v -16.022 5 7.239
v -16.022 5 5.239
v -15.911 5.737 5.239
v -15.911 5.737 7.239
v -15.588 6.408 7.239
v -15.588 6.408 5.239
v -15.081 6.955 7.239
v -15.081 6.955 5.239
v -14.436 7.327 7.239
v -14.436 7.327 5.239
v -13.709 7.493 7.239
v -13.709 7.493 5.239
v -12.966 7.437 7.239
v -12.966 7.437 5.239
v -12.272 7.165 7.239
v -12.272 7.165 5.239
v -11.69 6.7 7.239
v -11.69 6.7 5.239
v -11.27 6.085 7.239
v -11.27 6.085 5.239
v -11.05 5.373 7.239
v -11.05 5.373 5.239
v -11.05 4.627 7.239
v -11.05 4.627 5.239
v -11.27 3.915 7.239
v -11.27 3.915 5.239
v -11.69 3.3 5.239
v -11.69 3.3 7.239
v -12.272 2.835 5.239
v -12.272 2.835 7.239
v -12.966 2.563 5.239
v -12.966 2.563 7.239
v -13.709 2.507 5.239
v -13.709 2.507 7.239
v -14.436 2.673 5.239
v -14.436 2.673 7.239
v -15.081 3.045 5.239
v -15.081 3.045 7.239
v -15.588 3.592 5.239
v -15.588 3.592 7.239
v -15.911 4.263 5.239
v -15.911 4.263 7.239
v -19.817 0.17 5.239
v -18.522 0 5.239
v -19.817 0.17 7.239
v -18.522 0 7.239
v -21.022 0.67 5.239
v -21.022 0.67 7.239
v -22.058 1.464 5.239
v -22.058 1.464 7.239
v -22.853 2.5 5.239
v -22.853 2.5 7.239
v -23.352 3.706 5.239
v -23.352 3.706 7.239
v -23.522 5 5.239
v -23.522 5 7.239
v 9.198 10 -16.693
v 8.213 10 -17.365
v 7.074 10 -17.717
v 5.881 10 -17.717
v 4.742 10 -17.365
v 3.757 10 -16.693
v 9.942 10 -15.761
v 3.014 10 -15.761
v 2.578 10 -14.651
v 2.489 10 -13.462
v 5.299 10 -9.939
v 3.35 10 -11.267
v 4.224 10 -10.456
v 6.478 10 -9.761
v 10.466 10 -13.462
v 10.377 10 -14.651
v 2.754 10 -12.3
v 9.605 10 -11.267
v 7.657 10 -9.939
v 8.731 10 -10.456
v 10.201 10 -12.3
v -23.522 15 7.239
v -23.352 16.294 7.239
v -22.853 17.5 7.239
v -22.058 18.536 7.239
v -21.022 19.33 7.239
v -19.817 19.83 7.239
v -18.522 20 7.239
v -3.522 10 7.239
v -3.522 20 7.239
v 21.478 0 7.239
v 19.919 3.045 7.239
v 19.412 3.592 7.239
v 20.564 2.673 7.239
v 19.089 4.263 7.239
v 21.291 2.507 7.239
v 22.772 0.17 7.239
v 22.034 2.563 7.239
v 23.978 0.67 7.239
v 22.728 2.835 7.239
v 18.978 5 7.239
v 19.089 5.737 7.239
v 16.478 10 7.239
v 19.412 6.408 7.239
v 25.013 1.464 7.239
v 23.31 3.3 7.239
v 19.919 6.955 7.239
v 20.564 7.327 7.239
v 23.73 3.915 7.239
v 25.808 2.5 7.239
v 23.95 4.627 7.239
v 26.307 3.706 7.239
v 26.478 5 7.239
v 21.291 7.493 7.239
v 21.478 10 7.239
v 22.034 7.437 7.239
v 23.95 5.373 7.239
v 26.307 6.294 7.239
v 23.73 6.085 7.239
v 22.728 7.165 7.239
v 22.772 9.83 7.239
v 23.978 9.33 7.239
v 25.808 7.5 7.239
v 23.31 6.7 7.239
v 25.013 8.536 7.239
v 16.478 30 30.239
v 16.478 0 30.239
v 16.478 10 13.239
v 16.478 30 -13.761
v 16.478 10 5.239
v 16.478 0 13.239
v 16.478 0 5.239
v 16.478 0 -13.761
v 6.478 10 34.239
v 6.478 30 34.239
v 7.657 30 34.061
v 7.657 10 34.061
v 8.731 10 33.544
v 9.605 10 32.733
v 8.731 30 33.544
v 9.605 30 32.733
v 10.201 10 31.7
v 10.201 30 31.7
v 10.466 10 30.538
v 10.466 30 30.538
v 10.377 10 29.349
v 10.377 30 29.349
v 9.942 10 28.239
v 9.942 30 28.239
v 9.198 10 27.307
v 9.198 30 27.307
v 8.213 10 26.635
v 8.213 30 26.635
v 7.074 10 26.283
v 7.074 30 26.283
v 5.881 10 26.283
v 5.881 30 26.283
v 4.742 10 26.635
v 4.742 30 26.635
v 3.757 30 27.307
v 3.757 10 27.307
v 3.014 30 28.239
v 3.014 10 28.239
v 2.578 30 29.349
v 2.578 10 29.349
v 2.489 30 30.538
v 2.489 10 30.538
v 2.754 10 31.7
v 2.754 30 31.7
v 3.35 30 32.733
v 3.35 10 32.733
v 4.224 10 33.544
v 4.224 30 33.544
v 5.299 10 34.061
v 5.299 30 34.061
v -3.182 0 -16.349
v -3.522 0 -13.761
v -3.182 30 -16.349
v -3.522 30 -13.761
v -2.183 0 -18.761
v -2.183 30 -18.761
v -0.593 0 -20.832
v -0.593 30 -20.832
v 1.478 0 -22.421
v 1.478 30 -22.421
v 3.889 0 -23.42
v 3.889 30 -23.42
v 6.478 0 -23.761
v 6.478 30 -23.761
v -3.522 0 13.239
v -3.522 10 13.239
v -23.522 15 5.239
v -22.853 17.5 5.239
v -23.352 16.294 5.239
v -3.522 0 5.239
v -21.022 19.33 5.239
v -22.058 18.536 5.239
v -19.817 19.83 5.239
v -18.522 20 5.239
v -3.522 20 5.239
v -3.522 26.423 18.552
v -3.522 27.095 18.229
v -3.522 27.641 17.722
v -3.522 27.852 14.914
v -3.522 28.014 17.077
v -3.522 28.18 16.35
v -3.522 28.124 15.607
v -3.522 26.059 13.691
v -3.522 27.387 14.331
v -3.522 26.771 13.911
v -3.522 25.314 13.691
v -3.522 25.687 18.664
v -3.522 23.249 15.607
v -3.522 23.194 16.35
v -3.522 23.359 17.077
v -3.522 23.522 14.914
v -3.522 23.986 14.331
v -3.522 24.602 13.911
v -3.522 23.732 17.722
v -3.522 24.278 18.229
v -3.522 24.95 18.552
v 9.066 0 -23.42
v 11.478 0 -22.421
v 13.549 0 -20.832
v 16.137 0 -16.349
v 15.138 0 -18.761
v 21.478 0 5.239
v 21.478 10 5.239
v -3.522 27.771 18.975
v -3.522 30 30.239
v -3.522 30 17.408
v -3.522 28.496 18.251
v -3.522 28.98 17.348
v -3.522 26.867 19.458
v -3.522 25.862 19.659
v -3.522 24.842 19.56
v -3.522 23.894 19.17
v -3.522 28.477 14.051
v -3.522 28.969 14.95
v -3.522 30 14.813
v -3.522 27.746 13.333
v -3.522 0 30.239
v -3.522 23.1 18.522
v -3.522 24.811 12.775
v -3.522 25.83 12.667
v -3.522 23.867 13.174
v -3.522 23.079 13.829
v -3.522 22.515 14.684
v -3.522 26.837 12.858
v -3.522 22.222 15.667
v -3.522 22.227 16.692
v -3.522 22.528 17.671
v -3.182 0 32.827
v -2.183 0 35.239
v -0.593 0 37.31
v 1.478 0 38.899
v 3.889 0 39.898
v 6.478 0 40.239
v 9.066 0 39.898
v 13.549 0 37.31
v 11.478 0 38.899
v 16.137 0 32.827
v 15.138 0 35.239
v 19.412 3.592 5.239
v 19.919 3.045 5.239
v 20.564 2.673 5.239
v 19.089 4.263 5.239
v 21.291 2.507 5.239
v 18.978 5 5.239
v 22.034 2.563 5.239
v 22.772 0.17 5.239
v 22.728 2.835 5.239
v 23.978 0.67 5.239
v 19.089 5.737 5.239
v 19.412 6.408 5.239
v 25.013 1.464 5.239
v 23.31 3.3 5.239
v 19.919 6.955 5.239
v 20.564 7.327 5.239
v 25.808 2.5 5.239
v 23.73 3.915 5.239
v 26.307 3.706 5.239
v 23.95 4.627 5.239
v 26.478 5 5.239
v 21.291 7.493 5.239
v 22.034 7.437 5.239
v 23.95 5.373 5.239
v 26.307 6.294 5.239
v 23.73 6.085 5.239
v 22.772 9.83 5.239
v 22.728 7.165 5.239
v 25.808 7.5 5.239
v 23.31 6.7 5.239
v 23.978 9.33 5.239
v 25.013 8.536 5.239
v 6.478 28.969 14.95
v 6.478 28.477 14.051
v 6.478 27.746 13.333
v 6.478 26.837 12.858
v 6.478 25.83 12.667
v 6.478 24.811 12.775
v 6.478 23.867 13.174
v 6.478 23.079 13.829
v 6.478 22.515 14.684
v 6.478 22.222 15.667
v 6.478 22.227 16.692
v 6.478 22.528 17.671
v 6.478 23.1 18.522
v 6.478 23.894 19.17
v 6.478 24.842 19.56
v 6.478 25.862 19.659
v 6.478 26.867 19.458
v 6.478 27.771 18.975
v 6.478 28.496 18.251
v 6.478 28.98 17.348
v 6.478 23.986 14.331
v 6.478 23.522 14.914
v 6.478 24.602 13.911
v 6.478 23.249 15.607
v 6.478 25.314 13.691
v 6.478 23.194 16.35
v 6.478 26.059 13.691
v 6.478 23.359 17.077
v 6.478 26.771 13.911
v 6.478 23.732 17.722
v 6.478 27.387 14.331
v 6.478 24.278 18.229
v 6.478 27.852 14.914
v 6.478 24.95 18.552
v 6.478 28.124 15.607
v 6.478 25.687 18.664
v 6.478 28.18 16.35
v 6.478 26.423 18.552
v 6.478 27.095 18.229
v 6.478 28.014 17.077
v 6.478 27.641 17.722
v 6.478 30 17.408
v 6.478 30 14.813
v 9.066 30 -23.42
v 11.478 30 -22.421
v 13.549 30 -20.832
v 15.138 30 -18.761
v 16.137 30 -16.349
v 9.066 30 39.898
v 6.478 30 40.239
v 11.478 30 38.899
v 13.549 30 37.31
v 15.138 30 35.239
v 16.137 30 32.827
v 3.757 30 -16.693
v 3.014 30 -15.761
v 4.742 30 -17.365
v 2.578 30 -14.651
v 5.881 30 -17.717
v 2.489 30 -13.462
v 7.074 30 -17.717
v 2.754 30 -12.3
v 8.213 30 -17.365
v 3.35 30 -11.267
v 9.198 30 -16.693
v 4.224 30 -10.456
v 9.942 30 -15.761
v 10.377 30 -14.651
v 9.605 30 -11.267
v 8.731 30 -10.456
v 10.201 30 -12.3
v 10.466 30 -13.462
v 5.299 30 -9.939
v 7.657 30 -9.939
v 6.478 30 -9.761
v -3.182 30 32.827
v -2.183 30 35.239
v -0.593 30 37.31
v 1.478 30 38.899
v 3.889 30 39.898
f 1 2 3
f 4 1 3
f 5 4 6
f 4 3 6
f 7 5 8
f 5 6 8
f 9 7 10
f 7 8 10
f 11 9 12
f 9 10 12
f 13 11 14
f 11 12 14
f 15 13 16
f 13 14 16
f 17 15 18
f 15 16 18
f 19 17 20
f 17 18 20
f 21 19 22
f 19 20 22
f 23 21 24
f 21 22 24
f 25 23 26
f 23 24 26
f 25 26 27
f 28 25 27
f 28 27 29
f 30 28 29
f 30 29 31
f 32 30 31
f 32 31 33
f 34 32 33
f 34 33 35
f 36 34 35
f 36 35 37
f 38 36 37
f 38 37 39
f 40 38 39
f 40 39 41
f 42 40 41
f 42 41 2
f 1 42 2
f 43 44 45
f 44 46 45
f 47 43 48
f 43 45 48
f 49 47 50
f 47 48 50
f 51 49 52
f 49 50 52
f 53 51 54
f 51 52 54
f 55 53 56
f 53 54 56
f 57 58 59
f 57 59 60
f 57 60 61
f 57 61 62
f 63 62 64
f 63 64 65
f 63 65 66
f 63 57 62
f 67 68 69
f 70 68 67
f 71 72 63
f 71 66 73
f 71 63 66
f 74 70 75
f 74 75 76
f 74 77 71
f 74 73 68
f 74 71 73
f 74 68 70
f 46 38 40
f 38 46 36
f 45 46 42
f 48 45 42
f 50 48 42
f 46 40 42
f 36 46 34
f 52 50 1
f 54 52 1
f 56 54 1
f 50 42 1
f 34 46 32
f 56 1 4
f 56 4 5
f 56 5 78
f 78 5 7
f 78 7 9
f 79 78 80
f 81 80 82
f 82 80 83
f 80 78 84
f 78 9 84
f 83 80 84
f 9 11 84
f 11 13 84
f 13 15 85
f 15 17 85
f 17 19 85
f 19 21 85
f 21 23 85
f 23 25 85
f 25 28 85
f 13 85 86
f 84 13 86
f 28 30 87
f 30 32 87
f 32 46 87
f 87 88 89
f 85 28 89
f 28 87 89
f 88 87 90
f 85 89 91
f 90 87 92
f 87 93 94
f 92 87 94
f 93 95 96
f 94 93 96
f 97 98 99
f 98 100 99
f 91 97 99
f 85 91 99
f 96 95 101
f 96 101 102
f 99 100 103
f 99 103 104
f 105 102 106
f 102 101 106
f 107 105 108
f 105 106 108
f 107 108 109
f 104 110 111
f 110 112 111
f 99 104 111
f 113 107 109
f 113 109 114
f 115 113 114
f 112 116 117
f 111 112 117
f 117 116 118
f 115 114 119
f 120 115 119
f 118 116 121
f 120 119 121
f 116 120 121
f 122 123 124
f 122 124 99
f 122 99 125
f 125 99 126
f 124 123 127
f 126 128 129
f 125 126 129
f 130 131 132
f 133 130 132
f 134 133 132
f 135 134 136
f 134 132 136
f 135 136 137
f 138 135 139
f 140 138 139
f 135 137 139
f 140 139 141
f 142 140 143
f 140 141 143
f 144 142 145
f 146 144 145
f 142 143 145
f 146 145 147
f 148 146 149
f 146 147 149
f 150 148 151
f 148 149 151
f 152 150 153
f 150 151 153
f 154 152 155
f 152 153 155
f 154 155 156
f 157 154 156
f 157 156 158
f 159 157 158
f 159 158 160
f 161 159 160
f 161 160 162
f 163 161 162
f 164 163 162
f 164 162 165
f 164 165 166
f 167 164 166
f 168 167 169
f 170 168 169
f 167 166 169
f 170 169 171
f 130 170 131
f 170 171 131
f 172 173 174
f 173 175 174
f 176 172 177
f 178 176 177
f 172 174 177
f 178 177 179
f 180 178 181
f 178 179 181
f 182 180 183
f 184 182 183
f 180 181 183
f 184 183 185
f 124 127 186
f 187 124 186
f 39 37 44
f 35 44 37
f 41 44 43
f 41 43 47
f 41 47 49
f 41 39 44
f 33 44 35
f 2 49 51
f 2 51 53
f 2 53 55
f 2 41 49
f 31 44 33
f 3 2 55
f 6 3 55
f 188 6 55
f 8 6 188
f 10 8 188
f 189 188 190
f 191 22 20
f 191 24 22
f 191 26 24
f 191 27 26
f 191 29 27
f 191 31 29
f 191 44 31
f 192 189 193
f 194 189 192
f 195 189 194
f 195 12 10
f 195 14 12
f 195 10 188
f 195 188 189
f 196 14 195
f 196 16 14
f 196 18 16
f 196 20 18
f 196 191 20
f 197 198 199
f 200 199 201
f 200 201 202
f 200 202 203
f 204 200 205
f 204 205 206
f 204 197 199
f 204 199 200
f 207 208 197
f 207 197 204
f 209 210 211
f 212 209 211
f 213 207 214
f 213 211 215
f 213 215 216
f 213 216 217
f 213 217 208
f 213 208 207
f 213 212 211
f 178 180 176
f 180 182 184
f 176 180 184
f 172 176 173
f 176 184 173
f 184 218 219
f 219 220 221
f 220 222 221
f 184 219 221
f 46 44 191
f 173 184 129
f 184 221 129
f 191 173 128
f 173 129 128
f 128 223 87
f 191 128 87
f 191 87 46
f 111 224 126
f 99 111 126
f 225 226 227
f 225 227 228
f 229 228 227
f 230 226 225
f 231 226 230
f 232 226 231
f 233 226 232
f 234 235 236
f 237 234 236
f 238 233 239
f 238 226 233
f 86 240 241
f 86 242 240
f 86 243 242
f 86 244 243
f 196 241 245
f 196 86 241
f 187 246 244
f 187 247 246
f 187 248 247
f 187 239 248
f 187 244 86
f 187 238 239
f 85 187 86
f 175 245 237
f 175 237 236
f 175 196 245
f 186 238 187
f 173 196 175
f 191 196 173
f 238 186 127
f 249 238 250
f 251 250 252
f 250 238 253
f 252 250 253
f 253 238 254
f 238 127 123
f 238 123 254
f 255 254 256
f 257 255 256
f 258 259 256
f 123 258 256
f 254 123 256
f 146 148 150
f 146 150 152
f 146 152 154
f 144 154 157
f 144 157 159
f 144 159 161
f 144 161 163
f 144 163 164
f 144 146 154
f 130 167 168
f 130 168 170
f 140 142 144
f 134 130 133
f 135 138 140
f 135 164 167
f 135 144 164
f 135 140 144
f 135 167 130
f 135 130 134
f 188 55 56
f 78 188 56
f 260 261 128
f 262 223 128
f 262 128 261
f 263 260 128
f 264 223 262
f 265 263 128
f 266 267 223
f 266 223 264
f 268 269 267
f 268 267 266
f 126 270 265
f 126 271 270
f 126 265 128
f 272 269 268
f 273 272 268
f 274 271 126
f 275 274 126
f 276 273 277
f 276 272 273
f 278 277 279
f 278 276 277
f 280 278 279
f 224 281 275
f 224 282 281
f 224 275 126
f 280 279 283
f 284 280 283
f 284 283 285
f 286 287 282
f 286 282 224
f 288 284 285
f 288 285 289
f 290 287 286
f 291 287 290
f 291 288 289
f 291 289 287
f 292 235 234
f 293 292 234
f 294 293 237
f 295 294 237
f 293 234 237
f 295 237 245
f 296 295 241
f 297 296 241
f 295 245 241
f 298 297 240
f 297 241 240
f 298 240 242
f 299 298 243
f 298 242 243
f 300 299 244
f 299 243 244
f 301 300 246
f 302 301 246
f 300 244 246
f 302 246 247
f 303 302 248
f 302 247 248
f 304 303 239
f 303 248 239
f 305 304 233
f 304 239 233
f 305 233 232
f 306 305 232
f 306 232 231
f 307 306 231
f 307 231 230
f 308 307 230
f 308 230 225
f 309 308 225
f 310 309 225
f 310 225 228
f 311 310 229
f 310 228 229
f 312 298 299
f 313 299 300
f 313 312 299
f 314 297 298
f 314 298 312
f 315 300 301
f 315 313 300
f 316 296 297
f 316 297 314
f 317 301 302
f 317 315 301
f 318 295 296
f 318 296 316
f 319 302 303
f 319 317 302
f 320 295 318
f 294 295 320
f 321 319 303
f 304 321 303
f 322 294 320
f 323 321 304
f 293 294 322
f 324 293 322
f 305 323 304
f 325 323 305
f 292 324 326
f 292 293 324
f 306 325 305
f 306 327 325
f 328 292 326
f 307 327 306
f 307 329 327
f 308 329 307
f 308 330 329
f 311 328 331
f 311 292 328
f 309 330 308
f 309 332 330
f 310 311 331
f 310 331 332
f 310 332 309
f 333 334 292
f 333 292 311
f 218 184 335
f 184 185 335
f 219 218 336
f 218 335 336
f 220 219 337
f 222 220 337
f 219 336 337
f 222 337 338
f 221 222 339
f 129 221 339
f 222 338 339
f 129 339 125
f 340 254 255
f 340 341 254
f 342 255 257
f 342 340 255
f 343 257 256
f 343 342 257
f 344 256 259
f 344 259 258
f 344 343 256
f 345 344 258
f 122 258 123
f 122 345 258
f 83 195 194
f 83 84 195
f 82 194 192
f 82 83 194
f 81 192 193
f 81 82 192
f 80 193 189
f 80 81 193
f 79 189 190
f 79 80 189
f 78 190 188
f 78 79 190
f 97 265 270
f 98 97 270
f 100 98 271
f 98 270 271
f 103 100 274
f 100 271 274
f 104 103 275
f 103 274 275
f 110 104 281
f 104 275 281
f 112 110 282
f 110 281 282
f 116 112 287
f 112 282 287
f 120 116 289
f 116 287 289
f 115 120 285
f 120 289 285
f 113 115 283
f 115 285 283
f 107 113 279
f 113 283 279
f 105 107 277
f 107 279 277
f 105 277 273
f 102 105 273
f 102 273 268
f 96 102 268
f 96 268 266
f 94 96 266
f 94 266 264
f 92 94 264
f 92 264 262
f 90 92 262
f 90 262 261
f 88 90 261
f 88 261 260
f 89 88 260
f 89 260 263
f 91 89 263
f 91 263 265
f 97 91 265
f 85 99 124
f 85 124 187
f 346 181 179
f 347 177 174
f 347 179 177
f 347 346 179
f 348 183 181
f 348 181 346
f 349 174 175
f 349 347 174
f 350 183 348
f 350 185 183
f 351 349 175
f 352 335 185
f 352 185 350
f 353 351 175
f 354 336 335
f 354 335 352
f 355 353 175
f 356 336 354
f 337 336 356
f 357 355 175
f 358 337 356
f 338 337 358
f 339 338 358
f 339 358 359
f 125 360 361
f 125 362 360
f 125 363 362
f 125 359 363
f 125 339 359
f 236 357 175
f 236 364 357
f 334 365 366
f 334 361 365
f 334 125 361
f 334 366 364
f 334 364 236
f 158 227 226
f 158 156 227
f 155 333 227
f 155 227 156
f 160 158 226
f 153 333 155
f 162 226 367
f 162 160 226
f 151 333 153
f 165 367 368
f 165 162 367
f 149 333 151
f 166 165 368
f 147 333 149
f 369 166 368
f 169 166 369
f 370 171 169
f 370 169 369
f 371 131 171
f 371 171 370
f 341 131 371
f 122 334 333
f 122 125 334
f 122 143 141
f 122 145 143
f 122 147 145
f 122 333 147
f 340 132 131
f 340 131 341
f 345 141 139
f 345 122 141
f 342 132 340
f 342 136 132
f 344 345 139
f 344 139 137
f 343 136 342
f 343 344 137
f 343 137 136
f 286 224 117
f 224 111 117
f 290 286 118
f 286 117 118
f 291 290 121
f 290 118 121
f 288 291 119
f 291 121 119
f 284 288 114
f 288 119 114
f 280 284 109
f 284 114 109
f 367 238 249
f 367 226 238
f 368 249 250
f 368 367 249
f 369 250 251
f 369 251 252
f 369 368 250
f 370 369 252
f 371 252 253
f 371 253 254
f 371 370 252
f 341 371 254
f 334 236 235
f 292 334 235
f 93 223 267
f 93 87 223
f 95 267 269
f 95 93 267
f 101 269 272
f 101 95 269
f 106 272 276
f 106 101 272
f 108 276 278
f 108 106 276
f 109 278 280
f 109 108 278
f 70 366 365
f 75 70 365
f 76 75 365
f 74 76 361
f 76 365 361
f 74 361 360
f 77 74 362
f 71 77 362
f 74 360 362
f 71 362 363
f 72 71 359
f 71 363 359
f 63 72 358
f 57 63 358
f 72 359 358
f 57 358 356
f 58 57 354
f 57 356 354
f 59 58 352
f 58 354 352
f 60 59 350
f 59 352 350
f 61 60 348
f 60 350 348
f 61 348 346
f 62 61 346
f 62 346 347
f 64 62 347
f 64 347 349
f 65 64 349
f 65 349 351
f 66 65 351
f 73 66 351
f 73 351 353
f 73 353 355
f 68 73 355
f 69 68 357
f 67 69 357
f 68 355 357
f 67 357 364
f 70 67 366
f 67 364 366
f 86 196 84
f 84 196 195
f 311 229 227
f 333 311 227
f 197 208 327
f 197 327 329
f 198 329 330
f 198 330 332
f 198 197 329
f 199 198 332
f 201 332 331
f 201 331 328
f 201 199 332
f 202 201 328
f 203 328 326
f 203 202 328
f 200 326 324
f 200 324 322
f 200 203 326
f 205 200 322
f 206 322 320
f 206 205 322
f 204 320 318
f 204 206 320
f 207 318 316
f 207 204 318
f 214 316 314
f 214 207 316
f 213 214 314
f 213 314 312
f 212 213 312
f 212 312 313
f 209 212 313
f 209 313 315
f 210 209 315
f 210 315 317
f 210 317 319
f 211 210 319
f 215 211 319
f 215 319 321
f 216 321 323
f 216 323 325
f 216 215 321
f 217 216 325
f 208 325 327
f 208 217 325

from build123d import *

# Parameters (mm, degrees)
SKETCH2_W                = 20
SKETCH2_H                = 64
BOSS_EXTRUDE1_DEPTH      = 30
SKETCH3_R                = 4
CUT_EXTRUDE1_DEPTH       = 20
SKETCH4_R                = 2.5
CUT_EXTRUDE2_DEPTH       = 10
FILLET1_R                = 10
BOSS_EXTRUDE2_DEPTH      = 20
BOSS_EXTRUDE2_DEPTH_BACK = 30
SKETCH5_W                = 2
SKETCH5_H                = 30
CUT_EXTRUDE3_REACH       = 55.161
SKETCH6_R                = 2.5
SKETCH6_W                = 10
SKETCH6_H                = 20
SKETCH6_W_2              = 20
SKETCH6_H_2              = 10
FILLET2_R                = 5
SKETCH7_W                = 21
SKETCH7_H                = 6
CUT_EXTRUDE4_DEPTH       = 10


with BuildPart() as part:
    # Sketch2 → Boss-Extrude1 (new body)
    with BuildSketch(Plane(origin=(0, 0, 0), x_dir=(1, 0, 0), z_dir=(0, 1, 0))):
        with Locations((6.47761194, -8.23880597)):
            Rectangle(SKETCH2_W, SKETCH2_H)
    extrude(amount=BOSS_EXTRUDE1_DEPTH)

    # Sketch3 → Cut-Extrude1 (cut)
    with BuildSketch(Plane(origin=(0, 30, 0), x_dir=(1, 0, 0), z_dir=(0, 1, 0))):
        with Locations(Location((6.47761194, 13.76119403, 0), (0, 0, 270))):
            Circle(SKETCH3_R)
        with Locations(Location((6.47761194, -30.23880597, 0), (0, 0, 270))):
            Circle(SKETCH3_R)
    extrude(amount=-CUT_EXTRUDE1_DEPTH, mode=Mode.SUBTRACT)

    # Sketch4 → Cut-Extrude2 (cut)
    with BuildSketch(Plane.ZY.offset(3.52238806)):
        with BuildLine():
            Line((17.415034126, 30.126407987), (14.795699792, 30.126407987))
            Line((14.795699792, 30.126407987), (14.949961333, 28.969446425))
            ThreePointArc((14.949961333, 28.969446425), (16.17927412, 22.186618473), (17.347611009, 28.980215007))
            Line((17.347611009, 28.980215007), (17.415034126, 30.126407987))
        make_face()
        with Locations((16.163554702, 25.686583173)):
            Circle(SKETCH4_R, mode=Mode.SUBTRACT)
    extrude(amount=-CUT_EXTRUDE2_DEPTH, mode=Mode.SUBTRACT)

    # Fillet1
    fillet1_edges = [part.edges().sort_by_distance(p)[0] for p in [
        (-3.52238806, 15, -23.76119403),
        (16.47761194, 15, -23.76119403),
        (16.47761194, 15, 40.23880597),
        (-3.52238806, 15, 40.23880597),
    ]]
    fillet(fillet1_edges, radius=FILLET1_R - 0.0001)  # a hair under: the kernel refuses the full size

    # Sketch5 → Boss-Extrude2 (add, two sides: drawn at the far end of the back side and taken through both)
    with BuildSketch(Plane.ZY.offset(3.52238806).offset(-BOSS_EXTRUDE2_DEPTH_BACK)):
        with Locations((6.23880597, 15)):
            Rectangle(SKETCH5_W, SKETCH5_H)
    extrude(amount=BOSS_EXTRUDE2_DEPTH + BOSS_EXTRUDE2_DEPTH_BACK)

    # Sketch6 → Cut-Extrude3 (cut, up to next)
    with BuildSketch(Plane(origin=(0, 0, 5.23880597), x_dir=(-1, 0, 0), z_dir=(0, 0, -1)), mode=Mode.PRIVATE) as cut_extrude3_sk1:
        with Locations((-21.47761194, 5)):
            Circle(SKETCH6_R)
    cut_extrude3_tool1 = extrude(cut_extrude3_sk1.sketch, amount=-CUT_EXTRUDE3_REACH, mode=Mode.PRIVATE) & part.part
    # Sketch6 → Cut-Extrude3 (cut, up to next)
    with BuildSketch(Plane(origin=(0, 0, 5.23880597), x_dir=(-1, 0, 0), z_dir=(0, 0, -1)), mode=Mode.PRIVATE) as cut_extrude3_sk2:
        with Locations((13.52238806, 5)):
            Circle(SKETCH6_R)
    cut_extrude3_tool2 = extrude(cut_extrude3_sk2.sketch, amount=-CUT_EXTRUDE3_REACH, mode=Mode.PRIVATE) & part.part
    # Sketch6 → Cut-Extrude3 (cut, up to next)
    with BuildSketch(Plane(origin=(0, 0, 5.23880597), x_dir=(-1, 0, 0), z_dir=(0, 0, -1)), mode=Mode.PRIVATE) as cut_extrude3_sk3:
        with Locations((-21.47761194, 20)):
            Rectangle(SKETCH6_W, SKETCH6_H)
    cut_extrude3_tool3 = extrude(cut_extrude3_sk3.sketch, amount=-CUT_EXTRUDE3_REACH, mode=Mode.PRIVATE) & part.part
    # Sketch6 → Cut-Extrude3 (cut, up to next)
    with BuildSketch(Plane(origin=(0, 0, 5.23880597), x_dir=(-1, 0, 0), z_dir=(0, 0, -1)), mode=Mode.PRIVATE) as cut_extrude3_sk4:
        with Locations((13.52238806, 25)):
            Rectangle(SKETCH6_W_2, SKETCH6_H_2)
    cut_extrude3_tool4 = extrude(cut_extrude3_sk4.sketch, amount=-CUT_EXTRUDE3_REACH, mode=Mode.PRIVATE) & part.part
    add(cut_extrude3_tool1.solids().sort_by_distance((21.477612, 5, 5.238806))[0], mode=Mode.SUBTRACT)
    add(cut_extrude3_tool2.solids().sort_by_distance((-13.522388, 5, 5.238806))[0], mode=Mode.SUBTRACT)
    add(cut_extrude3_tool3.solids().sort_by_distance((21.477612, 20, 5.238806))[0], mode=Mode.SUBTRACT)
    add(cut_extrude3_tool4.solids().sort_by_distance((-13.522388, 25, 5.238806))[0], mode=Mode.SUBTRACT)

    # Fillet2
    fillet2_edges = [part.edges().sort_by_distance(p)[0] for p in [
        (-23.52238806, 20, 6.23880597),
        (-23.52238806, 0, 6.23880597),
        (26.47761194, 0, 6.23880597),
        (26.47761194, 10, 6.23880597),
    ]]
    fillet(fillet2_edges, radius=FILLET2_R - 0.0001)  # a hair under: the kernel refuses the full size

    # Sketch7 → Cut-Extrude4 (cut)
    with BuildSketch(Plane(origin=(0, 0, 0), x_dir=(-1, 0, 0), z_dir=(0, -1, 0))):
        with Locations((-6.47761194, -10.23880597)):
            Rectangle(SKETCH7_W, SKETCH7_H)
    extrude(amount=-CUT_EXTRUDE4_DEPTH, mode=Mode.SUBTRACT)


solid = part.part
